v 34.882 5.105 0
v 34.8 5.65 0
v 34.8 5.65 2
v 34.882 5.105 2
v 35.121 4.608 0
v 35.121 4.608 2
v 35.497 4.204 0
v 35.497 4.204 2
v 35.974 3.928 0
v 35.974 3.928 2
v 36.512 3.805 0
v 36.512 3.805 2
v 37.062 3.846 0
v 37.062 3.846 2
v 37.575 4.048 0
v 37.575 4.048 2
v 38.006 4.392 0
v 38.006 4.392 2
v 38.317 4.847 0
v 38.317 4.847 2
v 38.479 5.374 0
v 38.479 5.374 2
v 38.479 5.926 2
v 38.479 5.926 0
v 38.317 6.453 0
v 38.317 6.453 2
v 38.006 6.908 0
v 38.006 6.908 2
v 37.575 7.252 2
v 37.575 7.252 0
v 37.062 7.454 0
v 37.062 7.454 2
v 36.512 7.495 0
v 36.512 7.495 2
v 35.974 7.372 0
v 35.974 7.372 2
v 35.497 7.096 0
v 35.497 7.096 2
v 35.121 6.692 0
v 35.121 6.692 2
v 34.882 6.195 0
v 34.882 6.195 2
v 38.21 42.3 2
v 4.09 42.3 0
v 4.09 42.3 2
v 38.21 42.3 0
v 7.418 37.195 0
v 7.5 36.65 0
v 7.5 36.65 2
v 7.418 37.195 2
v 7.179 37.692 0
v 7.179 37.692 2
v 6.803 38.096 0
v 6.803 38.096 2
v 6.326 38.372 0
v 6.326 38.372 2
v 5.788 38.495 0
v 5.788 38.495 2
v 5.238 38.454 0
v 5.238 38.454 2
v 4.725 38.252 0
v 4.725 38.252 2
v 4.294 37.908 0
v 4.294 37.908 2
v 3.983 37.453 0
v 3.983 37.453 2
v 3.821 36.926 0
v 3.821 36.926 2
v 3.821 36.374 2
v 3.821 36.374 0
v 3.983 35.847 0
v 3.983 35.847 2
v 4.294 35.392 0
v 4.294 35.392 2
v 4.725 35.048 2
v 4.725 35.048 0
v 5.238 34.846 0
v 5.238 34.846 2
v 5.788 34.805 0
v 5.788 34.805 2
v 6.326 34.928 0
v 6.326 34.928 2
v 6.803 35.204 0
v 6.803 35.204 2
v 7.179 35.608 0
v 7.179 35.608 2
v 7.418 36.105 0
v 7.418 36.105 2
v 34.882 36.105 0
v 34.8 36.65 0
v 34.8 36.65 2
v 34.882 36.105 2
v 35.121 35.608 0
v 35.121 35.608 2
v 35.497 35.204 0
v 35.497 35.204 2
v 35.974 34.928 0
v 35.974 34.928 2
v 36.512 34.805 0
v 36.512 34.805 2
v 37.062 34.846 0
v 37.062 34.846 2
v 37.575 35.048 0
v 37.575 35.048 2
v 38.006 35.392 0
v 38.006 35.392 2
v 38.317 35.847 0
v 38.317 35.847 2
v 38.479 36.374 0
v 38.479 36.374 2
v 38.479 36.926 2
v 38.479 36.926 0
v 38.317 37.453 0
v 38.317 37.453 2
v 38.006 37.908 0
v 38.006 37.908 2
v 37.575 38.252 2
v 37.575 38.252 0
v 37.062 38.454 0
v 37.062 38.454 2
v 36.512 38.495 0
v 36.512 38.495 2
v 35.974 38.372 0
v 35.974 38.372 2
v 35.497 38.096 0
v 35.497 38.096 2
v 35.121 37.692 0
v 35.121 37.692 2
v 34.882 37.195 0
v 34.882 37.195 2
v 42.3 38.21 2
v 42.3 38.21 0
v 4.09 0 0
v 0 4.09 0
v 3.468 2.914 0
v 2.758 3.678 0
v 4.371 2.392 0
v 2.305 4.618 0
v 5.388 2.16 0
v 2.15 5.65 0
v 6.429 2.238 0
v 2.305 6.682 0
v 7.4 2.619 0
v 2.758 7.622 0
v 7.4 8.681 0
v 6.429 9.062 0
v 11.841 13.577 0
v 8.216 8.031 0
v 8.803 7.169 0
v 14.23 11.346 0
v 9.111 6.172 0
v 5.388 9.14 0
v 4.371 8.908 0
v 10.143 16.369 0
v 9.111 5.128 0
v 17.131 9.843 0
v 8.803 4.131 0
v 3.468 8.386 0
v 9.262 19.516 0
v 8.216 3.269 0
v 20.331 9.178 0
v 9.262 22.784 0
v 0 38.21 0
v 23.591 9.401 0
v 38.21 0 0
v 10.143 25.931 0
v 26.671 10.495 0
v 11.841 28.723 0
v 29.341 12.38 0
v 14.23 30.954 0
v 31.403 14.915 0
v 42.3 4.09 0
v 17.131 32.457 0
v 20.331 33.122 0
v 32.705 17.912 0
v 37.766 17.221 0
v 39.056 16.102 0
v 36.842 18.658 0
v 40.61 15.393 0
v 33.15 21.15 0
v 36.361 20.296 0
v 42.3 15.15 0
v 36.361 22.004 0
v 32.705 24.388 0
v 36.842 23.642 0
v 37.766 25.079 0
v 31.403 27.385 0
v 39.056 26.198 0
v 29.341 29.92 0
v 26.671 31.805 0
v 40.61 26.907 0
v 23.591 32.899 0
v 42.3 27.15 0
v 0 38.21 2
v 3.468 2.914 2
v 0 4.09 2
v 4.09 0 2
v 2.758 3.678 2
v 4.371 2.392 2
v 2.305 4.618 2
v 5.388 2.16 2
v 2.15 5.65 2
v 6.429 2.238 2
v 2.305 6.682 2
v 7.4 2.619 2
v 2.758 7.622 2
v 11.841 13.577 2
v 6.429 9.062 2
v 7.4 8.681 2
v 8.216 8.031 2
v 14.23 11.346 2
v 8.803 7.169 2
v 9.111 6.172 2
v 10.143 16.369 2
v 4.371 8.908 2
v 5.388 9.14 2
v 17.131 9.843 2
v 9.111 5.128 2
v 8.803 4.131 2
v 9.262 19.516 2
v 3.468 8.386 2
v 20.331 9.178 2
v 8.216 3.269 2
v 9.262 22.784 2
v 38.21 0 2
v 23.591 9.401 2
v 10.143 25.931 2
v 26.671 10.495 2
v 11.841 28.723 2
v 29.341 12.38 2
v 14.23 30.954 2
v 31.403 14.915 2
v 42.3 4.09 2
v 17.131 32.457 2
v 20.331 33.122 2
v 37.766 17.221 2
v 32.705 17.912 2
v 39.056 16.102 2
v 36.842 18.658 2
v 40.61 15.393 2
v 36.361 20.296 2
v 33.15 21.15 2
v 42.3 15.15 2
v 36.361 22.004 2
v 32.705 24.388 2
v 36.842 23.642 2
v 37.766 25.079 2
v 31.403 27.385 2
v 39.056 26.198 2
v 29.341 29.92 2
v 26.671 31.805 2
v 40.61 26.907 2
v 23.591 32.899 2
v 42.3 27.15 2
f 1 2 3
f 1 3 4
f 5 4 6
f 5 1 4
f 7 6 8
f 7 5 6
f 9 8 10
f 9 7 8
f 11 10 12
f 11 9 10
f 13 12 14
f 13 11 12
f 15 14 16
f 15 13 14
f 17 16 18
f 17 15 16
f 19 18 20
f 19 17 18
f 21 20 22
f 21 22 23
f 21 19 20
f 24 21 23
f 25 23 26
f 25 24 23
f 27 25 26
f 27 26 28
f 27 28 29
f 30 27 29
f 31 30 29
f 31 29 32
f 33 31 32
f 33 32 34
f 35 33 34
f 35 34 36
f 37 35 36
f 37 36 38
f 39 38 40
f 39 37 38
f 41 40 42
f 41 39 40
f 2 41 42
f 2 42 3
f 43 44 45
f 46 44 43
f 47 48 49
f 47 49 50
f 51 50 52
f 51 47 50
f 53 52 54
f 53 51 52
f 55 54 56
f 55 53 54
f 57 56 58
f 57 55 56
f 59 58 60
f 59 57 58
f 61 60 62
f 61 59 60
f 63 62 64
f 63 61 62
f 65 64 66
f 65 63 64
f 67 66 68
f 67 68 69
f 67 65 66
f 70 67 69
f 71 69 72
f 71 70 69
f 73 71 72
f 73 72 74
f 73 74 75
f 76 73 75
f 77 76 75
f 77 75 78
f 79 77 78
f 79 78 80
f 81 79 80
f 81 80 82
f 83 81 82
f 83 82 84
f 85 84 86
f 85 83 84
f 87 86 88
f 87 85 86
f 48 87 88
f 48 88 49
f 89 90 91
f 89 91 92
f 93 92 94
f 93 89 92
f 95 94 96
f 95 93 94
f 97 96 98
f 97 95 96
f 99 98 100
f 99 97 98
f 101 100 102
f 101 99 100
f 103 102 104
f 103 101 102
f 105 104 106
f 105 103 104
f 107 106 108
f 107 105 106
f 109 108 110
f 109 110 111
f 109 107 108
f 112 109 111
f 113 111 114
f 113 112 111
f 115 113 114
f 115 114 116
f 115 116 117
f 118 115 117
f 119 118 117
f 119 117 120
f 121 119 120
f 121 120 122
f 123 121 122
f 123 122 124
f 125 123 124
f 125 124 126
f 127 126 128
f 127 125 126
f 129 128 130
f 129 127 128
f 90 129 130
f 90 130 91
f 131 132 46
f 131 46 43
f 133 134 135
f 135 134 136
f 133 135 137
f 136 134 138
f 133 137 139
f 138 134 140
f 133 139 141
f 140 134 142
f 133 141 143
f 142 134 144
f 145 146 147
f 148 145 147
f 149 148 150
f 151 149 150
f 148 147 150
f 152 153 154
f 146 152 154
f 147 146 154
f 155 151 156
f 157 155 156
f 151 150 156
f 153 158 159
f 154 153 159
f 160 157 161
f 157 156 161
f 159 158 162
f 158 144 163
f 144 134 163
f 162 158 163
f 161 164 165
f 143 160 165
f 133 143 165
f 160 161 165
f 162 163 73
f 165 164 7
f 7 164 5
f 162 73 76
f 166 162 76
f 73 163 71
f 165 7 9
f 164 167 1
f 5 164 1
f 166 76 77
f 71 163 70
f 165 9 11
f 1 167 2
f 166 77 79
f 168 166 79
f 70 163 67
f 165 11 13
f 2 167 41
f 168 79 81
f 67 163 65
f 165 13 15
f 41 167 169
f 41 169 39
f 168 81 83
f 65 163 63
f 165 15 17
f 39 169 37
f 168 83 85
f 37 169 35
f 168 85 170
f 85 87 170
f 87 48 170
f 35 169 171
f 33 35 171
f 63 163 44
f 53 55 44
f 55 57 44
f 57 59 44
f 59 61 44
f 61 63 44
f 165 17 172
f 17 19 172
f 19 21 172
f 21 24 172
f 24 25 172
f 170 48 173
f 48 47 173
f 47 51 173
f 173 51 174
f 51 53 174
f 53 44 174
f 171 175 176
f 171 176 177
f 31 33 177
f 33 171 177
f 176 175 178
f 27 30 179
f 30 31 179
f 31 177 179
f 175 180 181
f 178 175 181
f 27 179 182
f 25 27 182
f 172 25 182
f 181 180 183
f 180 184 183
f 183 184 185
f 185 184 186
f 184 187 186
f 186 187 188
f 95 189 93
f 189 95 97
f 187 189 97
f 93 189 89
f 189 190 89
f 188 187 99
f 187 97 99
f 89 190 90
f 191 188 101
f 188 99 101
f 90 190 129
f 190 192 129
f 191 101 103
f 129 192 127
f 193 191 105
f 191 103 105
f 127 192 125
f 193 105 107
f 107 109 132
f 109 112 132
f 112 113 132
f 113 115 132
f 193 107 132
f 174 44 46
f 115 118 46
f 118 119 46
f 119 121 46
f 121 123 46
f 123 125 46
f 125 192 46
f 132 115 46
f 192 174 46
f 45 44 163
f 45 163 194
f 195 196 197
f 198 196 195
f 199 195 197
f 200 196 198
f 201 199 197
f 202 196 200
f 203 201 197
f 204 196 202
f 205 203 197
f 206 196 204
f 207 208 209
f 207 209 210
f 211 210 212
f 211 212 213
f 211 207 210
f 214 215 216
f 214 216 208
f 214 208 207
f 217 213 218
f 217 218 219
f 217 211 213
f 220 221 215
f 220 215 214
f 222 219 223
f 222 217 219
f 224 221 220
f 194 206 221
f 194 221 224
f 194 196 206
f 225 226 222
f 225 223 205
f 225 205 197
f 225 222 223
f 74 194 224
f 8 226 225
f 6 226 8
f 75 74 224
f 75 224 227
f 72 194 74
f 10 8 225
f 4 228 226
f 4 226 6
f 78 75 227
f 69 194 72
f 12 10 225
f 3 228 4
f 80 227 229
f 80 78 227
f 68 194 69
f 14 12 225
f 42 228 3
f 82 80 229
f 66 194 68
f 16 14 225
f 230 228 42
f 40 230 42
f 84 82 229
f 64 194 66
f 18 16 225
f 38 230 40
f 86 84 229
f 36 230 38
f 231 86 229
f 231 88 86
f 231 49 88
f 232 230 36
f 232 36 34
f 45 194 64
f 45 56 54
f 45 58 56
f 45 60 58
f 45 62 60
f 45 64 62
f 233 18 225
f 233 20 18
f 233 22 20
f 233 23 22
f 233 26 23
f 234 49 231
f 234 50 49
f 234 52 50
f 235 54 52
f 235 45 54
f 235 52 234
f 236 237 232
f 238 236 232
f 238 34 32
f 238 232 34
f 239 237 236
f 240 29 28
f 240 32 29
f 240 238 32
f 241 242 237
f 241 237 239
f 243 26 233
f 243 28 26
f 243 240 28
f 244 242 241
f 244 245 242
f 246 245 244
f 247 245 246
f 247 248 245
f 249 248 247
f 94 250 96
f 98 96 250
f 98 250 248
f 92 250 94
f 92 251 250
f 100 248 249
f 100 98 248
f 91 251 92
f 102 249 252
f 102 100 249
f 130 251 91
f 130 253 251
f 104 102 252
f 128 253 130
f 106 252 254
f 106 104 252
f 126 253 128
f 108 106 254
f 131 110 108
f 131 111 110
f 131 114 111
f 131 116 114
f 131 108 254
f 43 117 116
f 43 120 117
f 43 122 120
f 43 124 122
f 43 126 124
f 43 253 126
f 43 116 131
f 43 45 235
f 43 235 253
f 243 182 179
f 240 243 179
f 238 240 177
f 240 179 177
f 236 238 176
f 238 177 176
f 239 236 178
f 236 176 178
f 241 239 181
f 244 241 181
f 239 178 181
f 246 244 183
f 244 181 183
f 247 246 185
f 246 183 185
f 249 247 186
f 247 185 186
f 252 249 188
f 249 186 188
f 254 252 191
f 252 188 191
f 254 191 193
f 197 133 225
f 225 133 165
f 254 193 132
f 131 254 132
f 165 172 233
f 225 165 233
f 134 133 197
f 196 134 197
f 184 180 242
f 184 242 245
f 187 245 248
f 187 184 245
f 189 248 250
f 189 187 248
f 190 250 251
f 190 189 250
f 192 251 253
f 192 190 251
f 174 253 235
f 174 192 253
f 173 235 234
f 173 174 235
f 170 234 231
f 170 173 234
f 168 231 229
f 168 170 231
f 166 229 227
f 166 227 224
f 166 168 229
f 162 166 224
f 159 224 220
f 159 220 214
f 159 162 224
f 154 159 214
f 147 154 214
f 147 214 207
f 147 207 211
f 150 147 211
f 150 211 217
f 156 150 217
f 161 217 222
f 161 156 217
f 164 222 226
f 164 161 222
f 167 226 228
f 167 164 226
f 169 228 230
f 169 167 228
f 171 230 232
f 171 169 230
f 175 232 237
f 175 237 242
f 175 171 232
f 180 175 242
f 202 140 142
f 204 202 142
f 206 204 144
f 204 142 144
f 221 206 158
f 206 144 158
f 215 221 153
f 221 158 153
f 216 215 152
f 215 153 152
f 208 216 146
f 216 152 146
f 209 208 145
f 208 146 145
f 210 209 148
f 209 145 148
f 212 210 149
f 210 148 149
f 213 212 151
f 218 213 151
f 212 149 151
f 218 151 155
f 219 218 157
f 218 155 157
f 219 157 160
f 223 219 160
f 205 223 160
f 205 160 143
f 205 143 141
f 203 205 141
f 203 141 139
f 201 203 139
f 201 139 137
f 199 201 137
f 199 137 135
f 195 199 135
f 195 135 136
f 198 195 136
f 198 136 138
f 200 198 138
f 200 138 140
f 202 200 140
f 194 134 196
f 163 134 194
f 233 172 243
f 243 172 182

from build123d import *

# Parameters (mm, degrees)
CROQUIS1_W              = 42.3
CROQUIS1_H              = 42.3
CROQUIS1_R              = 1.85
CROQUIS1_R_2            = 12
SALIENTE_EXTRUIR1_DEPTH = 2
CHAFL_N1_SIZE           = 4.09
CROQUIS2_R              = 6
CORTAR_EXTRUIR1_DEPTH   = 60.854657296
CROQUIS4_R              = 3.5
CORTAR_EXTRUIR3_DEPTH   = 60.854657296


with BuildPart() as part:
    # Croquis1 → Saliente-Extruir1 (new body)
    with BuildSketch(Plane.XY):
        with Locations((21.15, 21.15)):
            Rectangle(CROQUIS1_W, CROQUIS1_H)
        with Locations((5.65, 36.65)):
            Circle(CROQUIS1_R, mode=Mode.SUBTRACT)
        with Locations((5.65, 5.65)):
            Circle(CROQUIS1_R, mode=Mode.SUBTRACT)
        with Locations(Location((36.65, 5.65, 0), (0, 0, 180))):
            Circle(CROQUIS1_R, mode=Mode.SUBTRACT)
        with Locations(Location((36.65, 36.65, 0), (0, 0, 180))):
            Circle(CROQUIS1_R, mode=Mode.SUBTRACT)
        with Locations((21.15, 21.15)):
            Circle(CROQUIS1_R_2, mode=Mode.SUBTRACT)
    extrude(amount=SALIENTE_EXTRUIR1_DEPTH)

    # Chaflán1
    chafl_n1_edges = [part.edges().sort_by_distance(p)[0] for p in [
        (0, 42.3, 1),
        (42.3, 42.3, 1),
        (42.3, 0, 1),
        (0, 0, 1),
    ]]
    chamfer(chafl_n1_edges, length=CHAFL_N1_SIZE)

    # Croquis2 → Cortar-Extruir1 (cut, through all)
    with BuildSketch(Plane(origin=(0, 0, 0), x_dir=(-1, 0, 0), z_dir=(0, 0, -1))):
        with Locations((-42.3, 21.15)):
            Circle(CROQUIS2_R)
    extrude(amount=-CORTAR_EXTRUIR1_DEPTH, mode=Mode.SUBTRACT)

    # Croquis4 → Cortar-Extruir3 (cut, through all)
    with BuildSketch(Plane(origin=(0, 0, 0), x_dir=(-1, 0, 0), z_dir=(0, 0, -1))):
        with Locations((-5.65, 5.65)):
            Circle(CROQUIS4_R)
    extrude(amount=-CORTAR_EXTRUIR3_DEPTH, mode=Mode.SUBTRACT)


solid = part.part
